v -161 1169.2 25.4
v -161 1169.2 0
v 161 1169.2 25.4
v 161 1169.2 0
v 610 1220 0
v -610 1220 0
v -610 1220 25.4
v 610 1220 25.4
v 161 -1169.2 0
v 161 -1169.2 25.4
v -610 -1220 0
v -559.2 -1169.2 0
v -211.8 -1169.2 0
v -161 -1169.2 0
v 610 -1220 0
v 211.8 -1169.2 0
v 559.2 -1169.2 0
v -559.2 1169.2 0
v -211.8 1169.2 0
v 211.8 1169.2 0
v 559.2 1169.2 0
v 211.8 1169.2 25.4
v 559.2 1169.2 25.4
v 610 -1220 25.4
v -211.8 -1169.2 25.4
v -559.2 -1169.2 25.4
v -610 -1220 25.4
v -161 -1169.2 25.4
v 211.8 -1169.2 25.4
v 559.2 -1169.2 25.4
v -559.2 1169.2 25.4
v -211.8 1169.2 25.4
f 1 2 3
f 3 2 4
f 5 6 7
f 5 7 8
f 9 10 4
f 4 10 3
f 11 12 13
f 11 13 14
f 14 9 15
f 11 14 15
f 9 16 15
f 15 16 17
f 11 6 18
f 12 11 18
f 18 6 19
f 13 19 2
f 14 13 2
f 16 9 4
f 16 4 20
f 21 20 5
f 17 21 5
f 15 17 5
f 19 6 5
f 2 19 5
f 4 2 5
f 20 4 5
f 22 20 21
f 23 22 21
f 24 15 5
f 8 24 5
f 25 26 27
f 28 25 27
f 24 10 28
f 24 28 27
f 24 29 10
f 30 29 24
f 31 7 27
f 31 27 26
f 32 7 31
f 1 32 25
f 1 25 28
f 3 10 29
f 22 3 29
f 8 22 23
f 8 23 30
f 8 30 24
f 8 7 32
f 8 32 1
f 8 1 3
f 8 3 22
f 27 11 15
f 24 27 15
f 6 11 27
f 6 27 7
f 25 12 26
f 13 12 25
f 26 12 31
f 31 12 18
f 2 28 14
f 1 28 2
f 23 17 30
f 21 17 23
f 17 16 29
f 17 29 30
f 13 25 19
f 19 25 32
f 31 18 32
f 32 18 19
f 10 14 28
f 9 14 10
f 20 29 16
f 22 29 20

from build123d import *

# Parameters (mm, degrees)
CROQUIS1_W              = 1220
CROQUIS1_H              = 2440
CROQUIS1_W_2            = 1118.4
CROQUIS1_H_2            = 2338.4
SALIENTE_EXTRUIR1_DEPTH = 25.4
CROQUIS2_W              = 50.8
CROQUIS2_H              = 2338.4
SALIENTE_EXTRUIR2_DEPTH = 25.4


with BuildPart() as part:
    # Croquis1 → Saliente-Extruir1 (new body)
    with BuildSketch(Plane.XY):
        Rectangle(CROQUIS1_W, CROQUIS1_H)
        Rectangle(CROQUIS1_W_2, CROQUIS1_H_2, mode=Mode.SUBTRACT)
    extrude(amount=SALIENTE_EXTRUIR1_DEPTH)

    # Croquis2 → Saliente-Extruir2 (add)
    with BuildSketch(Plane.XY.offset(25.4)):
        with Locations((-186.4, 0)):
            Rectangle(CROQUIS2_W, CROQUIS2_H)
        with Locations((186.4, 0)):
            Rectangle(CROQUIS2_W, CROQUIS2_H)
    extrude(amount=-SALIENTE_EXTRUIR2_DEPTH)


solid = part.part
